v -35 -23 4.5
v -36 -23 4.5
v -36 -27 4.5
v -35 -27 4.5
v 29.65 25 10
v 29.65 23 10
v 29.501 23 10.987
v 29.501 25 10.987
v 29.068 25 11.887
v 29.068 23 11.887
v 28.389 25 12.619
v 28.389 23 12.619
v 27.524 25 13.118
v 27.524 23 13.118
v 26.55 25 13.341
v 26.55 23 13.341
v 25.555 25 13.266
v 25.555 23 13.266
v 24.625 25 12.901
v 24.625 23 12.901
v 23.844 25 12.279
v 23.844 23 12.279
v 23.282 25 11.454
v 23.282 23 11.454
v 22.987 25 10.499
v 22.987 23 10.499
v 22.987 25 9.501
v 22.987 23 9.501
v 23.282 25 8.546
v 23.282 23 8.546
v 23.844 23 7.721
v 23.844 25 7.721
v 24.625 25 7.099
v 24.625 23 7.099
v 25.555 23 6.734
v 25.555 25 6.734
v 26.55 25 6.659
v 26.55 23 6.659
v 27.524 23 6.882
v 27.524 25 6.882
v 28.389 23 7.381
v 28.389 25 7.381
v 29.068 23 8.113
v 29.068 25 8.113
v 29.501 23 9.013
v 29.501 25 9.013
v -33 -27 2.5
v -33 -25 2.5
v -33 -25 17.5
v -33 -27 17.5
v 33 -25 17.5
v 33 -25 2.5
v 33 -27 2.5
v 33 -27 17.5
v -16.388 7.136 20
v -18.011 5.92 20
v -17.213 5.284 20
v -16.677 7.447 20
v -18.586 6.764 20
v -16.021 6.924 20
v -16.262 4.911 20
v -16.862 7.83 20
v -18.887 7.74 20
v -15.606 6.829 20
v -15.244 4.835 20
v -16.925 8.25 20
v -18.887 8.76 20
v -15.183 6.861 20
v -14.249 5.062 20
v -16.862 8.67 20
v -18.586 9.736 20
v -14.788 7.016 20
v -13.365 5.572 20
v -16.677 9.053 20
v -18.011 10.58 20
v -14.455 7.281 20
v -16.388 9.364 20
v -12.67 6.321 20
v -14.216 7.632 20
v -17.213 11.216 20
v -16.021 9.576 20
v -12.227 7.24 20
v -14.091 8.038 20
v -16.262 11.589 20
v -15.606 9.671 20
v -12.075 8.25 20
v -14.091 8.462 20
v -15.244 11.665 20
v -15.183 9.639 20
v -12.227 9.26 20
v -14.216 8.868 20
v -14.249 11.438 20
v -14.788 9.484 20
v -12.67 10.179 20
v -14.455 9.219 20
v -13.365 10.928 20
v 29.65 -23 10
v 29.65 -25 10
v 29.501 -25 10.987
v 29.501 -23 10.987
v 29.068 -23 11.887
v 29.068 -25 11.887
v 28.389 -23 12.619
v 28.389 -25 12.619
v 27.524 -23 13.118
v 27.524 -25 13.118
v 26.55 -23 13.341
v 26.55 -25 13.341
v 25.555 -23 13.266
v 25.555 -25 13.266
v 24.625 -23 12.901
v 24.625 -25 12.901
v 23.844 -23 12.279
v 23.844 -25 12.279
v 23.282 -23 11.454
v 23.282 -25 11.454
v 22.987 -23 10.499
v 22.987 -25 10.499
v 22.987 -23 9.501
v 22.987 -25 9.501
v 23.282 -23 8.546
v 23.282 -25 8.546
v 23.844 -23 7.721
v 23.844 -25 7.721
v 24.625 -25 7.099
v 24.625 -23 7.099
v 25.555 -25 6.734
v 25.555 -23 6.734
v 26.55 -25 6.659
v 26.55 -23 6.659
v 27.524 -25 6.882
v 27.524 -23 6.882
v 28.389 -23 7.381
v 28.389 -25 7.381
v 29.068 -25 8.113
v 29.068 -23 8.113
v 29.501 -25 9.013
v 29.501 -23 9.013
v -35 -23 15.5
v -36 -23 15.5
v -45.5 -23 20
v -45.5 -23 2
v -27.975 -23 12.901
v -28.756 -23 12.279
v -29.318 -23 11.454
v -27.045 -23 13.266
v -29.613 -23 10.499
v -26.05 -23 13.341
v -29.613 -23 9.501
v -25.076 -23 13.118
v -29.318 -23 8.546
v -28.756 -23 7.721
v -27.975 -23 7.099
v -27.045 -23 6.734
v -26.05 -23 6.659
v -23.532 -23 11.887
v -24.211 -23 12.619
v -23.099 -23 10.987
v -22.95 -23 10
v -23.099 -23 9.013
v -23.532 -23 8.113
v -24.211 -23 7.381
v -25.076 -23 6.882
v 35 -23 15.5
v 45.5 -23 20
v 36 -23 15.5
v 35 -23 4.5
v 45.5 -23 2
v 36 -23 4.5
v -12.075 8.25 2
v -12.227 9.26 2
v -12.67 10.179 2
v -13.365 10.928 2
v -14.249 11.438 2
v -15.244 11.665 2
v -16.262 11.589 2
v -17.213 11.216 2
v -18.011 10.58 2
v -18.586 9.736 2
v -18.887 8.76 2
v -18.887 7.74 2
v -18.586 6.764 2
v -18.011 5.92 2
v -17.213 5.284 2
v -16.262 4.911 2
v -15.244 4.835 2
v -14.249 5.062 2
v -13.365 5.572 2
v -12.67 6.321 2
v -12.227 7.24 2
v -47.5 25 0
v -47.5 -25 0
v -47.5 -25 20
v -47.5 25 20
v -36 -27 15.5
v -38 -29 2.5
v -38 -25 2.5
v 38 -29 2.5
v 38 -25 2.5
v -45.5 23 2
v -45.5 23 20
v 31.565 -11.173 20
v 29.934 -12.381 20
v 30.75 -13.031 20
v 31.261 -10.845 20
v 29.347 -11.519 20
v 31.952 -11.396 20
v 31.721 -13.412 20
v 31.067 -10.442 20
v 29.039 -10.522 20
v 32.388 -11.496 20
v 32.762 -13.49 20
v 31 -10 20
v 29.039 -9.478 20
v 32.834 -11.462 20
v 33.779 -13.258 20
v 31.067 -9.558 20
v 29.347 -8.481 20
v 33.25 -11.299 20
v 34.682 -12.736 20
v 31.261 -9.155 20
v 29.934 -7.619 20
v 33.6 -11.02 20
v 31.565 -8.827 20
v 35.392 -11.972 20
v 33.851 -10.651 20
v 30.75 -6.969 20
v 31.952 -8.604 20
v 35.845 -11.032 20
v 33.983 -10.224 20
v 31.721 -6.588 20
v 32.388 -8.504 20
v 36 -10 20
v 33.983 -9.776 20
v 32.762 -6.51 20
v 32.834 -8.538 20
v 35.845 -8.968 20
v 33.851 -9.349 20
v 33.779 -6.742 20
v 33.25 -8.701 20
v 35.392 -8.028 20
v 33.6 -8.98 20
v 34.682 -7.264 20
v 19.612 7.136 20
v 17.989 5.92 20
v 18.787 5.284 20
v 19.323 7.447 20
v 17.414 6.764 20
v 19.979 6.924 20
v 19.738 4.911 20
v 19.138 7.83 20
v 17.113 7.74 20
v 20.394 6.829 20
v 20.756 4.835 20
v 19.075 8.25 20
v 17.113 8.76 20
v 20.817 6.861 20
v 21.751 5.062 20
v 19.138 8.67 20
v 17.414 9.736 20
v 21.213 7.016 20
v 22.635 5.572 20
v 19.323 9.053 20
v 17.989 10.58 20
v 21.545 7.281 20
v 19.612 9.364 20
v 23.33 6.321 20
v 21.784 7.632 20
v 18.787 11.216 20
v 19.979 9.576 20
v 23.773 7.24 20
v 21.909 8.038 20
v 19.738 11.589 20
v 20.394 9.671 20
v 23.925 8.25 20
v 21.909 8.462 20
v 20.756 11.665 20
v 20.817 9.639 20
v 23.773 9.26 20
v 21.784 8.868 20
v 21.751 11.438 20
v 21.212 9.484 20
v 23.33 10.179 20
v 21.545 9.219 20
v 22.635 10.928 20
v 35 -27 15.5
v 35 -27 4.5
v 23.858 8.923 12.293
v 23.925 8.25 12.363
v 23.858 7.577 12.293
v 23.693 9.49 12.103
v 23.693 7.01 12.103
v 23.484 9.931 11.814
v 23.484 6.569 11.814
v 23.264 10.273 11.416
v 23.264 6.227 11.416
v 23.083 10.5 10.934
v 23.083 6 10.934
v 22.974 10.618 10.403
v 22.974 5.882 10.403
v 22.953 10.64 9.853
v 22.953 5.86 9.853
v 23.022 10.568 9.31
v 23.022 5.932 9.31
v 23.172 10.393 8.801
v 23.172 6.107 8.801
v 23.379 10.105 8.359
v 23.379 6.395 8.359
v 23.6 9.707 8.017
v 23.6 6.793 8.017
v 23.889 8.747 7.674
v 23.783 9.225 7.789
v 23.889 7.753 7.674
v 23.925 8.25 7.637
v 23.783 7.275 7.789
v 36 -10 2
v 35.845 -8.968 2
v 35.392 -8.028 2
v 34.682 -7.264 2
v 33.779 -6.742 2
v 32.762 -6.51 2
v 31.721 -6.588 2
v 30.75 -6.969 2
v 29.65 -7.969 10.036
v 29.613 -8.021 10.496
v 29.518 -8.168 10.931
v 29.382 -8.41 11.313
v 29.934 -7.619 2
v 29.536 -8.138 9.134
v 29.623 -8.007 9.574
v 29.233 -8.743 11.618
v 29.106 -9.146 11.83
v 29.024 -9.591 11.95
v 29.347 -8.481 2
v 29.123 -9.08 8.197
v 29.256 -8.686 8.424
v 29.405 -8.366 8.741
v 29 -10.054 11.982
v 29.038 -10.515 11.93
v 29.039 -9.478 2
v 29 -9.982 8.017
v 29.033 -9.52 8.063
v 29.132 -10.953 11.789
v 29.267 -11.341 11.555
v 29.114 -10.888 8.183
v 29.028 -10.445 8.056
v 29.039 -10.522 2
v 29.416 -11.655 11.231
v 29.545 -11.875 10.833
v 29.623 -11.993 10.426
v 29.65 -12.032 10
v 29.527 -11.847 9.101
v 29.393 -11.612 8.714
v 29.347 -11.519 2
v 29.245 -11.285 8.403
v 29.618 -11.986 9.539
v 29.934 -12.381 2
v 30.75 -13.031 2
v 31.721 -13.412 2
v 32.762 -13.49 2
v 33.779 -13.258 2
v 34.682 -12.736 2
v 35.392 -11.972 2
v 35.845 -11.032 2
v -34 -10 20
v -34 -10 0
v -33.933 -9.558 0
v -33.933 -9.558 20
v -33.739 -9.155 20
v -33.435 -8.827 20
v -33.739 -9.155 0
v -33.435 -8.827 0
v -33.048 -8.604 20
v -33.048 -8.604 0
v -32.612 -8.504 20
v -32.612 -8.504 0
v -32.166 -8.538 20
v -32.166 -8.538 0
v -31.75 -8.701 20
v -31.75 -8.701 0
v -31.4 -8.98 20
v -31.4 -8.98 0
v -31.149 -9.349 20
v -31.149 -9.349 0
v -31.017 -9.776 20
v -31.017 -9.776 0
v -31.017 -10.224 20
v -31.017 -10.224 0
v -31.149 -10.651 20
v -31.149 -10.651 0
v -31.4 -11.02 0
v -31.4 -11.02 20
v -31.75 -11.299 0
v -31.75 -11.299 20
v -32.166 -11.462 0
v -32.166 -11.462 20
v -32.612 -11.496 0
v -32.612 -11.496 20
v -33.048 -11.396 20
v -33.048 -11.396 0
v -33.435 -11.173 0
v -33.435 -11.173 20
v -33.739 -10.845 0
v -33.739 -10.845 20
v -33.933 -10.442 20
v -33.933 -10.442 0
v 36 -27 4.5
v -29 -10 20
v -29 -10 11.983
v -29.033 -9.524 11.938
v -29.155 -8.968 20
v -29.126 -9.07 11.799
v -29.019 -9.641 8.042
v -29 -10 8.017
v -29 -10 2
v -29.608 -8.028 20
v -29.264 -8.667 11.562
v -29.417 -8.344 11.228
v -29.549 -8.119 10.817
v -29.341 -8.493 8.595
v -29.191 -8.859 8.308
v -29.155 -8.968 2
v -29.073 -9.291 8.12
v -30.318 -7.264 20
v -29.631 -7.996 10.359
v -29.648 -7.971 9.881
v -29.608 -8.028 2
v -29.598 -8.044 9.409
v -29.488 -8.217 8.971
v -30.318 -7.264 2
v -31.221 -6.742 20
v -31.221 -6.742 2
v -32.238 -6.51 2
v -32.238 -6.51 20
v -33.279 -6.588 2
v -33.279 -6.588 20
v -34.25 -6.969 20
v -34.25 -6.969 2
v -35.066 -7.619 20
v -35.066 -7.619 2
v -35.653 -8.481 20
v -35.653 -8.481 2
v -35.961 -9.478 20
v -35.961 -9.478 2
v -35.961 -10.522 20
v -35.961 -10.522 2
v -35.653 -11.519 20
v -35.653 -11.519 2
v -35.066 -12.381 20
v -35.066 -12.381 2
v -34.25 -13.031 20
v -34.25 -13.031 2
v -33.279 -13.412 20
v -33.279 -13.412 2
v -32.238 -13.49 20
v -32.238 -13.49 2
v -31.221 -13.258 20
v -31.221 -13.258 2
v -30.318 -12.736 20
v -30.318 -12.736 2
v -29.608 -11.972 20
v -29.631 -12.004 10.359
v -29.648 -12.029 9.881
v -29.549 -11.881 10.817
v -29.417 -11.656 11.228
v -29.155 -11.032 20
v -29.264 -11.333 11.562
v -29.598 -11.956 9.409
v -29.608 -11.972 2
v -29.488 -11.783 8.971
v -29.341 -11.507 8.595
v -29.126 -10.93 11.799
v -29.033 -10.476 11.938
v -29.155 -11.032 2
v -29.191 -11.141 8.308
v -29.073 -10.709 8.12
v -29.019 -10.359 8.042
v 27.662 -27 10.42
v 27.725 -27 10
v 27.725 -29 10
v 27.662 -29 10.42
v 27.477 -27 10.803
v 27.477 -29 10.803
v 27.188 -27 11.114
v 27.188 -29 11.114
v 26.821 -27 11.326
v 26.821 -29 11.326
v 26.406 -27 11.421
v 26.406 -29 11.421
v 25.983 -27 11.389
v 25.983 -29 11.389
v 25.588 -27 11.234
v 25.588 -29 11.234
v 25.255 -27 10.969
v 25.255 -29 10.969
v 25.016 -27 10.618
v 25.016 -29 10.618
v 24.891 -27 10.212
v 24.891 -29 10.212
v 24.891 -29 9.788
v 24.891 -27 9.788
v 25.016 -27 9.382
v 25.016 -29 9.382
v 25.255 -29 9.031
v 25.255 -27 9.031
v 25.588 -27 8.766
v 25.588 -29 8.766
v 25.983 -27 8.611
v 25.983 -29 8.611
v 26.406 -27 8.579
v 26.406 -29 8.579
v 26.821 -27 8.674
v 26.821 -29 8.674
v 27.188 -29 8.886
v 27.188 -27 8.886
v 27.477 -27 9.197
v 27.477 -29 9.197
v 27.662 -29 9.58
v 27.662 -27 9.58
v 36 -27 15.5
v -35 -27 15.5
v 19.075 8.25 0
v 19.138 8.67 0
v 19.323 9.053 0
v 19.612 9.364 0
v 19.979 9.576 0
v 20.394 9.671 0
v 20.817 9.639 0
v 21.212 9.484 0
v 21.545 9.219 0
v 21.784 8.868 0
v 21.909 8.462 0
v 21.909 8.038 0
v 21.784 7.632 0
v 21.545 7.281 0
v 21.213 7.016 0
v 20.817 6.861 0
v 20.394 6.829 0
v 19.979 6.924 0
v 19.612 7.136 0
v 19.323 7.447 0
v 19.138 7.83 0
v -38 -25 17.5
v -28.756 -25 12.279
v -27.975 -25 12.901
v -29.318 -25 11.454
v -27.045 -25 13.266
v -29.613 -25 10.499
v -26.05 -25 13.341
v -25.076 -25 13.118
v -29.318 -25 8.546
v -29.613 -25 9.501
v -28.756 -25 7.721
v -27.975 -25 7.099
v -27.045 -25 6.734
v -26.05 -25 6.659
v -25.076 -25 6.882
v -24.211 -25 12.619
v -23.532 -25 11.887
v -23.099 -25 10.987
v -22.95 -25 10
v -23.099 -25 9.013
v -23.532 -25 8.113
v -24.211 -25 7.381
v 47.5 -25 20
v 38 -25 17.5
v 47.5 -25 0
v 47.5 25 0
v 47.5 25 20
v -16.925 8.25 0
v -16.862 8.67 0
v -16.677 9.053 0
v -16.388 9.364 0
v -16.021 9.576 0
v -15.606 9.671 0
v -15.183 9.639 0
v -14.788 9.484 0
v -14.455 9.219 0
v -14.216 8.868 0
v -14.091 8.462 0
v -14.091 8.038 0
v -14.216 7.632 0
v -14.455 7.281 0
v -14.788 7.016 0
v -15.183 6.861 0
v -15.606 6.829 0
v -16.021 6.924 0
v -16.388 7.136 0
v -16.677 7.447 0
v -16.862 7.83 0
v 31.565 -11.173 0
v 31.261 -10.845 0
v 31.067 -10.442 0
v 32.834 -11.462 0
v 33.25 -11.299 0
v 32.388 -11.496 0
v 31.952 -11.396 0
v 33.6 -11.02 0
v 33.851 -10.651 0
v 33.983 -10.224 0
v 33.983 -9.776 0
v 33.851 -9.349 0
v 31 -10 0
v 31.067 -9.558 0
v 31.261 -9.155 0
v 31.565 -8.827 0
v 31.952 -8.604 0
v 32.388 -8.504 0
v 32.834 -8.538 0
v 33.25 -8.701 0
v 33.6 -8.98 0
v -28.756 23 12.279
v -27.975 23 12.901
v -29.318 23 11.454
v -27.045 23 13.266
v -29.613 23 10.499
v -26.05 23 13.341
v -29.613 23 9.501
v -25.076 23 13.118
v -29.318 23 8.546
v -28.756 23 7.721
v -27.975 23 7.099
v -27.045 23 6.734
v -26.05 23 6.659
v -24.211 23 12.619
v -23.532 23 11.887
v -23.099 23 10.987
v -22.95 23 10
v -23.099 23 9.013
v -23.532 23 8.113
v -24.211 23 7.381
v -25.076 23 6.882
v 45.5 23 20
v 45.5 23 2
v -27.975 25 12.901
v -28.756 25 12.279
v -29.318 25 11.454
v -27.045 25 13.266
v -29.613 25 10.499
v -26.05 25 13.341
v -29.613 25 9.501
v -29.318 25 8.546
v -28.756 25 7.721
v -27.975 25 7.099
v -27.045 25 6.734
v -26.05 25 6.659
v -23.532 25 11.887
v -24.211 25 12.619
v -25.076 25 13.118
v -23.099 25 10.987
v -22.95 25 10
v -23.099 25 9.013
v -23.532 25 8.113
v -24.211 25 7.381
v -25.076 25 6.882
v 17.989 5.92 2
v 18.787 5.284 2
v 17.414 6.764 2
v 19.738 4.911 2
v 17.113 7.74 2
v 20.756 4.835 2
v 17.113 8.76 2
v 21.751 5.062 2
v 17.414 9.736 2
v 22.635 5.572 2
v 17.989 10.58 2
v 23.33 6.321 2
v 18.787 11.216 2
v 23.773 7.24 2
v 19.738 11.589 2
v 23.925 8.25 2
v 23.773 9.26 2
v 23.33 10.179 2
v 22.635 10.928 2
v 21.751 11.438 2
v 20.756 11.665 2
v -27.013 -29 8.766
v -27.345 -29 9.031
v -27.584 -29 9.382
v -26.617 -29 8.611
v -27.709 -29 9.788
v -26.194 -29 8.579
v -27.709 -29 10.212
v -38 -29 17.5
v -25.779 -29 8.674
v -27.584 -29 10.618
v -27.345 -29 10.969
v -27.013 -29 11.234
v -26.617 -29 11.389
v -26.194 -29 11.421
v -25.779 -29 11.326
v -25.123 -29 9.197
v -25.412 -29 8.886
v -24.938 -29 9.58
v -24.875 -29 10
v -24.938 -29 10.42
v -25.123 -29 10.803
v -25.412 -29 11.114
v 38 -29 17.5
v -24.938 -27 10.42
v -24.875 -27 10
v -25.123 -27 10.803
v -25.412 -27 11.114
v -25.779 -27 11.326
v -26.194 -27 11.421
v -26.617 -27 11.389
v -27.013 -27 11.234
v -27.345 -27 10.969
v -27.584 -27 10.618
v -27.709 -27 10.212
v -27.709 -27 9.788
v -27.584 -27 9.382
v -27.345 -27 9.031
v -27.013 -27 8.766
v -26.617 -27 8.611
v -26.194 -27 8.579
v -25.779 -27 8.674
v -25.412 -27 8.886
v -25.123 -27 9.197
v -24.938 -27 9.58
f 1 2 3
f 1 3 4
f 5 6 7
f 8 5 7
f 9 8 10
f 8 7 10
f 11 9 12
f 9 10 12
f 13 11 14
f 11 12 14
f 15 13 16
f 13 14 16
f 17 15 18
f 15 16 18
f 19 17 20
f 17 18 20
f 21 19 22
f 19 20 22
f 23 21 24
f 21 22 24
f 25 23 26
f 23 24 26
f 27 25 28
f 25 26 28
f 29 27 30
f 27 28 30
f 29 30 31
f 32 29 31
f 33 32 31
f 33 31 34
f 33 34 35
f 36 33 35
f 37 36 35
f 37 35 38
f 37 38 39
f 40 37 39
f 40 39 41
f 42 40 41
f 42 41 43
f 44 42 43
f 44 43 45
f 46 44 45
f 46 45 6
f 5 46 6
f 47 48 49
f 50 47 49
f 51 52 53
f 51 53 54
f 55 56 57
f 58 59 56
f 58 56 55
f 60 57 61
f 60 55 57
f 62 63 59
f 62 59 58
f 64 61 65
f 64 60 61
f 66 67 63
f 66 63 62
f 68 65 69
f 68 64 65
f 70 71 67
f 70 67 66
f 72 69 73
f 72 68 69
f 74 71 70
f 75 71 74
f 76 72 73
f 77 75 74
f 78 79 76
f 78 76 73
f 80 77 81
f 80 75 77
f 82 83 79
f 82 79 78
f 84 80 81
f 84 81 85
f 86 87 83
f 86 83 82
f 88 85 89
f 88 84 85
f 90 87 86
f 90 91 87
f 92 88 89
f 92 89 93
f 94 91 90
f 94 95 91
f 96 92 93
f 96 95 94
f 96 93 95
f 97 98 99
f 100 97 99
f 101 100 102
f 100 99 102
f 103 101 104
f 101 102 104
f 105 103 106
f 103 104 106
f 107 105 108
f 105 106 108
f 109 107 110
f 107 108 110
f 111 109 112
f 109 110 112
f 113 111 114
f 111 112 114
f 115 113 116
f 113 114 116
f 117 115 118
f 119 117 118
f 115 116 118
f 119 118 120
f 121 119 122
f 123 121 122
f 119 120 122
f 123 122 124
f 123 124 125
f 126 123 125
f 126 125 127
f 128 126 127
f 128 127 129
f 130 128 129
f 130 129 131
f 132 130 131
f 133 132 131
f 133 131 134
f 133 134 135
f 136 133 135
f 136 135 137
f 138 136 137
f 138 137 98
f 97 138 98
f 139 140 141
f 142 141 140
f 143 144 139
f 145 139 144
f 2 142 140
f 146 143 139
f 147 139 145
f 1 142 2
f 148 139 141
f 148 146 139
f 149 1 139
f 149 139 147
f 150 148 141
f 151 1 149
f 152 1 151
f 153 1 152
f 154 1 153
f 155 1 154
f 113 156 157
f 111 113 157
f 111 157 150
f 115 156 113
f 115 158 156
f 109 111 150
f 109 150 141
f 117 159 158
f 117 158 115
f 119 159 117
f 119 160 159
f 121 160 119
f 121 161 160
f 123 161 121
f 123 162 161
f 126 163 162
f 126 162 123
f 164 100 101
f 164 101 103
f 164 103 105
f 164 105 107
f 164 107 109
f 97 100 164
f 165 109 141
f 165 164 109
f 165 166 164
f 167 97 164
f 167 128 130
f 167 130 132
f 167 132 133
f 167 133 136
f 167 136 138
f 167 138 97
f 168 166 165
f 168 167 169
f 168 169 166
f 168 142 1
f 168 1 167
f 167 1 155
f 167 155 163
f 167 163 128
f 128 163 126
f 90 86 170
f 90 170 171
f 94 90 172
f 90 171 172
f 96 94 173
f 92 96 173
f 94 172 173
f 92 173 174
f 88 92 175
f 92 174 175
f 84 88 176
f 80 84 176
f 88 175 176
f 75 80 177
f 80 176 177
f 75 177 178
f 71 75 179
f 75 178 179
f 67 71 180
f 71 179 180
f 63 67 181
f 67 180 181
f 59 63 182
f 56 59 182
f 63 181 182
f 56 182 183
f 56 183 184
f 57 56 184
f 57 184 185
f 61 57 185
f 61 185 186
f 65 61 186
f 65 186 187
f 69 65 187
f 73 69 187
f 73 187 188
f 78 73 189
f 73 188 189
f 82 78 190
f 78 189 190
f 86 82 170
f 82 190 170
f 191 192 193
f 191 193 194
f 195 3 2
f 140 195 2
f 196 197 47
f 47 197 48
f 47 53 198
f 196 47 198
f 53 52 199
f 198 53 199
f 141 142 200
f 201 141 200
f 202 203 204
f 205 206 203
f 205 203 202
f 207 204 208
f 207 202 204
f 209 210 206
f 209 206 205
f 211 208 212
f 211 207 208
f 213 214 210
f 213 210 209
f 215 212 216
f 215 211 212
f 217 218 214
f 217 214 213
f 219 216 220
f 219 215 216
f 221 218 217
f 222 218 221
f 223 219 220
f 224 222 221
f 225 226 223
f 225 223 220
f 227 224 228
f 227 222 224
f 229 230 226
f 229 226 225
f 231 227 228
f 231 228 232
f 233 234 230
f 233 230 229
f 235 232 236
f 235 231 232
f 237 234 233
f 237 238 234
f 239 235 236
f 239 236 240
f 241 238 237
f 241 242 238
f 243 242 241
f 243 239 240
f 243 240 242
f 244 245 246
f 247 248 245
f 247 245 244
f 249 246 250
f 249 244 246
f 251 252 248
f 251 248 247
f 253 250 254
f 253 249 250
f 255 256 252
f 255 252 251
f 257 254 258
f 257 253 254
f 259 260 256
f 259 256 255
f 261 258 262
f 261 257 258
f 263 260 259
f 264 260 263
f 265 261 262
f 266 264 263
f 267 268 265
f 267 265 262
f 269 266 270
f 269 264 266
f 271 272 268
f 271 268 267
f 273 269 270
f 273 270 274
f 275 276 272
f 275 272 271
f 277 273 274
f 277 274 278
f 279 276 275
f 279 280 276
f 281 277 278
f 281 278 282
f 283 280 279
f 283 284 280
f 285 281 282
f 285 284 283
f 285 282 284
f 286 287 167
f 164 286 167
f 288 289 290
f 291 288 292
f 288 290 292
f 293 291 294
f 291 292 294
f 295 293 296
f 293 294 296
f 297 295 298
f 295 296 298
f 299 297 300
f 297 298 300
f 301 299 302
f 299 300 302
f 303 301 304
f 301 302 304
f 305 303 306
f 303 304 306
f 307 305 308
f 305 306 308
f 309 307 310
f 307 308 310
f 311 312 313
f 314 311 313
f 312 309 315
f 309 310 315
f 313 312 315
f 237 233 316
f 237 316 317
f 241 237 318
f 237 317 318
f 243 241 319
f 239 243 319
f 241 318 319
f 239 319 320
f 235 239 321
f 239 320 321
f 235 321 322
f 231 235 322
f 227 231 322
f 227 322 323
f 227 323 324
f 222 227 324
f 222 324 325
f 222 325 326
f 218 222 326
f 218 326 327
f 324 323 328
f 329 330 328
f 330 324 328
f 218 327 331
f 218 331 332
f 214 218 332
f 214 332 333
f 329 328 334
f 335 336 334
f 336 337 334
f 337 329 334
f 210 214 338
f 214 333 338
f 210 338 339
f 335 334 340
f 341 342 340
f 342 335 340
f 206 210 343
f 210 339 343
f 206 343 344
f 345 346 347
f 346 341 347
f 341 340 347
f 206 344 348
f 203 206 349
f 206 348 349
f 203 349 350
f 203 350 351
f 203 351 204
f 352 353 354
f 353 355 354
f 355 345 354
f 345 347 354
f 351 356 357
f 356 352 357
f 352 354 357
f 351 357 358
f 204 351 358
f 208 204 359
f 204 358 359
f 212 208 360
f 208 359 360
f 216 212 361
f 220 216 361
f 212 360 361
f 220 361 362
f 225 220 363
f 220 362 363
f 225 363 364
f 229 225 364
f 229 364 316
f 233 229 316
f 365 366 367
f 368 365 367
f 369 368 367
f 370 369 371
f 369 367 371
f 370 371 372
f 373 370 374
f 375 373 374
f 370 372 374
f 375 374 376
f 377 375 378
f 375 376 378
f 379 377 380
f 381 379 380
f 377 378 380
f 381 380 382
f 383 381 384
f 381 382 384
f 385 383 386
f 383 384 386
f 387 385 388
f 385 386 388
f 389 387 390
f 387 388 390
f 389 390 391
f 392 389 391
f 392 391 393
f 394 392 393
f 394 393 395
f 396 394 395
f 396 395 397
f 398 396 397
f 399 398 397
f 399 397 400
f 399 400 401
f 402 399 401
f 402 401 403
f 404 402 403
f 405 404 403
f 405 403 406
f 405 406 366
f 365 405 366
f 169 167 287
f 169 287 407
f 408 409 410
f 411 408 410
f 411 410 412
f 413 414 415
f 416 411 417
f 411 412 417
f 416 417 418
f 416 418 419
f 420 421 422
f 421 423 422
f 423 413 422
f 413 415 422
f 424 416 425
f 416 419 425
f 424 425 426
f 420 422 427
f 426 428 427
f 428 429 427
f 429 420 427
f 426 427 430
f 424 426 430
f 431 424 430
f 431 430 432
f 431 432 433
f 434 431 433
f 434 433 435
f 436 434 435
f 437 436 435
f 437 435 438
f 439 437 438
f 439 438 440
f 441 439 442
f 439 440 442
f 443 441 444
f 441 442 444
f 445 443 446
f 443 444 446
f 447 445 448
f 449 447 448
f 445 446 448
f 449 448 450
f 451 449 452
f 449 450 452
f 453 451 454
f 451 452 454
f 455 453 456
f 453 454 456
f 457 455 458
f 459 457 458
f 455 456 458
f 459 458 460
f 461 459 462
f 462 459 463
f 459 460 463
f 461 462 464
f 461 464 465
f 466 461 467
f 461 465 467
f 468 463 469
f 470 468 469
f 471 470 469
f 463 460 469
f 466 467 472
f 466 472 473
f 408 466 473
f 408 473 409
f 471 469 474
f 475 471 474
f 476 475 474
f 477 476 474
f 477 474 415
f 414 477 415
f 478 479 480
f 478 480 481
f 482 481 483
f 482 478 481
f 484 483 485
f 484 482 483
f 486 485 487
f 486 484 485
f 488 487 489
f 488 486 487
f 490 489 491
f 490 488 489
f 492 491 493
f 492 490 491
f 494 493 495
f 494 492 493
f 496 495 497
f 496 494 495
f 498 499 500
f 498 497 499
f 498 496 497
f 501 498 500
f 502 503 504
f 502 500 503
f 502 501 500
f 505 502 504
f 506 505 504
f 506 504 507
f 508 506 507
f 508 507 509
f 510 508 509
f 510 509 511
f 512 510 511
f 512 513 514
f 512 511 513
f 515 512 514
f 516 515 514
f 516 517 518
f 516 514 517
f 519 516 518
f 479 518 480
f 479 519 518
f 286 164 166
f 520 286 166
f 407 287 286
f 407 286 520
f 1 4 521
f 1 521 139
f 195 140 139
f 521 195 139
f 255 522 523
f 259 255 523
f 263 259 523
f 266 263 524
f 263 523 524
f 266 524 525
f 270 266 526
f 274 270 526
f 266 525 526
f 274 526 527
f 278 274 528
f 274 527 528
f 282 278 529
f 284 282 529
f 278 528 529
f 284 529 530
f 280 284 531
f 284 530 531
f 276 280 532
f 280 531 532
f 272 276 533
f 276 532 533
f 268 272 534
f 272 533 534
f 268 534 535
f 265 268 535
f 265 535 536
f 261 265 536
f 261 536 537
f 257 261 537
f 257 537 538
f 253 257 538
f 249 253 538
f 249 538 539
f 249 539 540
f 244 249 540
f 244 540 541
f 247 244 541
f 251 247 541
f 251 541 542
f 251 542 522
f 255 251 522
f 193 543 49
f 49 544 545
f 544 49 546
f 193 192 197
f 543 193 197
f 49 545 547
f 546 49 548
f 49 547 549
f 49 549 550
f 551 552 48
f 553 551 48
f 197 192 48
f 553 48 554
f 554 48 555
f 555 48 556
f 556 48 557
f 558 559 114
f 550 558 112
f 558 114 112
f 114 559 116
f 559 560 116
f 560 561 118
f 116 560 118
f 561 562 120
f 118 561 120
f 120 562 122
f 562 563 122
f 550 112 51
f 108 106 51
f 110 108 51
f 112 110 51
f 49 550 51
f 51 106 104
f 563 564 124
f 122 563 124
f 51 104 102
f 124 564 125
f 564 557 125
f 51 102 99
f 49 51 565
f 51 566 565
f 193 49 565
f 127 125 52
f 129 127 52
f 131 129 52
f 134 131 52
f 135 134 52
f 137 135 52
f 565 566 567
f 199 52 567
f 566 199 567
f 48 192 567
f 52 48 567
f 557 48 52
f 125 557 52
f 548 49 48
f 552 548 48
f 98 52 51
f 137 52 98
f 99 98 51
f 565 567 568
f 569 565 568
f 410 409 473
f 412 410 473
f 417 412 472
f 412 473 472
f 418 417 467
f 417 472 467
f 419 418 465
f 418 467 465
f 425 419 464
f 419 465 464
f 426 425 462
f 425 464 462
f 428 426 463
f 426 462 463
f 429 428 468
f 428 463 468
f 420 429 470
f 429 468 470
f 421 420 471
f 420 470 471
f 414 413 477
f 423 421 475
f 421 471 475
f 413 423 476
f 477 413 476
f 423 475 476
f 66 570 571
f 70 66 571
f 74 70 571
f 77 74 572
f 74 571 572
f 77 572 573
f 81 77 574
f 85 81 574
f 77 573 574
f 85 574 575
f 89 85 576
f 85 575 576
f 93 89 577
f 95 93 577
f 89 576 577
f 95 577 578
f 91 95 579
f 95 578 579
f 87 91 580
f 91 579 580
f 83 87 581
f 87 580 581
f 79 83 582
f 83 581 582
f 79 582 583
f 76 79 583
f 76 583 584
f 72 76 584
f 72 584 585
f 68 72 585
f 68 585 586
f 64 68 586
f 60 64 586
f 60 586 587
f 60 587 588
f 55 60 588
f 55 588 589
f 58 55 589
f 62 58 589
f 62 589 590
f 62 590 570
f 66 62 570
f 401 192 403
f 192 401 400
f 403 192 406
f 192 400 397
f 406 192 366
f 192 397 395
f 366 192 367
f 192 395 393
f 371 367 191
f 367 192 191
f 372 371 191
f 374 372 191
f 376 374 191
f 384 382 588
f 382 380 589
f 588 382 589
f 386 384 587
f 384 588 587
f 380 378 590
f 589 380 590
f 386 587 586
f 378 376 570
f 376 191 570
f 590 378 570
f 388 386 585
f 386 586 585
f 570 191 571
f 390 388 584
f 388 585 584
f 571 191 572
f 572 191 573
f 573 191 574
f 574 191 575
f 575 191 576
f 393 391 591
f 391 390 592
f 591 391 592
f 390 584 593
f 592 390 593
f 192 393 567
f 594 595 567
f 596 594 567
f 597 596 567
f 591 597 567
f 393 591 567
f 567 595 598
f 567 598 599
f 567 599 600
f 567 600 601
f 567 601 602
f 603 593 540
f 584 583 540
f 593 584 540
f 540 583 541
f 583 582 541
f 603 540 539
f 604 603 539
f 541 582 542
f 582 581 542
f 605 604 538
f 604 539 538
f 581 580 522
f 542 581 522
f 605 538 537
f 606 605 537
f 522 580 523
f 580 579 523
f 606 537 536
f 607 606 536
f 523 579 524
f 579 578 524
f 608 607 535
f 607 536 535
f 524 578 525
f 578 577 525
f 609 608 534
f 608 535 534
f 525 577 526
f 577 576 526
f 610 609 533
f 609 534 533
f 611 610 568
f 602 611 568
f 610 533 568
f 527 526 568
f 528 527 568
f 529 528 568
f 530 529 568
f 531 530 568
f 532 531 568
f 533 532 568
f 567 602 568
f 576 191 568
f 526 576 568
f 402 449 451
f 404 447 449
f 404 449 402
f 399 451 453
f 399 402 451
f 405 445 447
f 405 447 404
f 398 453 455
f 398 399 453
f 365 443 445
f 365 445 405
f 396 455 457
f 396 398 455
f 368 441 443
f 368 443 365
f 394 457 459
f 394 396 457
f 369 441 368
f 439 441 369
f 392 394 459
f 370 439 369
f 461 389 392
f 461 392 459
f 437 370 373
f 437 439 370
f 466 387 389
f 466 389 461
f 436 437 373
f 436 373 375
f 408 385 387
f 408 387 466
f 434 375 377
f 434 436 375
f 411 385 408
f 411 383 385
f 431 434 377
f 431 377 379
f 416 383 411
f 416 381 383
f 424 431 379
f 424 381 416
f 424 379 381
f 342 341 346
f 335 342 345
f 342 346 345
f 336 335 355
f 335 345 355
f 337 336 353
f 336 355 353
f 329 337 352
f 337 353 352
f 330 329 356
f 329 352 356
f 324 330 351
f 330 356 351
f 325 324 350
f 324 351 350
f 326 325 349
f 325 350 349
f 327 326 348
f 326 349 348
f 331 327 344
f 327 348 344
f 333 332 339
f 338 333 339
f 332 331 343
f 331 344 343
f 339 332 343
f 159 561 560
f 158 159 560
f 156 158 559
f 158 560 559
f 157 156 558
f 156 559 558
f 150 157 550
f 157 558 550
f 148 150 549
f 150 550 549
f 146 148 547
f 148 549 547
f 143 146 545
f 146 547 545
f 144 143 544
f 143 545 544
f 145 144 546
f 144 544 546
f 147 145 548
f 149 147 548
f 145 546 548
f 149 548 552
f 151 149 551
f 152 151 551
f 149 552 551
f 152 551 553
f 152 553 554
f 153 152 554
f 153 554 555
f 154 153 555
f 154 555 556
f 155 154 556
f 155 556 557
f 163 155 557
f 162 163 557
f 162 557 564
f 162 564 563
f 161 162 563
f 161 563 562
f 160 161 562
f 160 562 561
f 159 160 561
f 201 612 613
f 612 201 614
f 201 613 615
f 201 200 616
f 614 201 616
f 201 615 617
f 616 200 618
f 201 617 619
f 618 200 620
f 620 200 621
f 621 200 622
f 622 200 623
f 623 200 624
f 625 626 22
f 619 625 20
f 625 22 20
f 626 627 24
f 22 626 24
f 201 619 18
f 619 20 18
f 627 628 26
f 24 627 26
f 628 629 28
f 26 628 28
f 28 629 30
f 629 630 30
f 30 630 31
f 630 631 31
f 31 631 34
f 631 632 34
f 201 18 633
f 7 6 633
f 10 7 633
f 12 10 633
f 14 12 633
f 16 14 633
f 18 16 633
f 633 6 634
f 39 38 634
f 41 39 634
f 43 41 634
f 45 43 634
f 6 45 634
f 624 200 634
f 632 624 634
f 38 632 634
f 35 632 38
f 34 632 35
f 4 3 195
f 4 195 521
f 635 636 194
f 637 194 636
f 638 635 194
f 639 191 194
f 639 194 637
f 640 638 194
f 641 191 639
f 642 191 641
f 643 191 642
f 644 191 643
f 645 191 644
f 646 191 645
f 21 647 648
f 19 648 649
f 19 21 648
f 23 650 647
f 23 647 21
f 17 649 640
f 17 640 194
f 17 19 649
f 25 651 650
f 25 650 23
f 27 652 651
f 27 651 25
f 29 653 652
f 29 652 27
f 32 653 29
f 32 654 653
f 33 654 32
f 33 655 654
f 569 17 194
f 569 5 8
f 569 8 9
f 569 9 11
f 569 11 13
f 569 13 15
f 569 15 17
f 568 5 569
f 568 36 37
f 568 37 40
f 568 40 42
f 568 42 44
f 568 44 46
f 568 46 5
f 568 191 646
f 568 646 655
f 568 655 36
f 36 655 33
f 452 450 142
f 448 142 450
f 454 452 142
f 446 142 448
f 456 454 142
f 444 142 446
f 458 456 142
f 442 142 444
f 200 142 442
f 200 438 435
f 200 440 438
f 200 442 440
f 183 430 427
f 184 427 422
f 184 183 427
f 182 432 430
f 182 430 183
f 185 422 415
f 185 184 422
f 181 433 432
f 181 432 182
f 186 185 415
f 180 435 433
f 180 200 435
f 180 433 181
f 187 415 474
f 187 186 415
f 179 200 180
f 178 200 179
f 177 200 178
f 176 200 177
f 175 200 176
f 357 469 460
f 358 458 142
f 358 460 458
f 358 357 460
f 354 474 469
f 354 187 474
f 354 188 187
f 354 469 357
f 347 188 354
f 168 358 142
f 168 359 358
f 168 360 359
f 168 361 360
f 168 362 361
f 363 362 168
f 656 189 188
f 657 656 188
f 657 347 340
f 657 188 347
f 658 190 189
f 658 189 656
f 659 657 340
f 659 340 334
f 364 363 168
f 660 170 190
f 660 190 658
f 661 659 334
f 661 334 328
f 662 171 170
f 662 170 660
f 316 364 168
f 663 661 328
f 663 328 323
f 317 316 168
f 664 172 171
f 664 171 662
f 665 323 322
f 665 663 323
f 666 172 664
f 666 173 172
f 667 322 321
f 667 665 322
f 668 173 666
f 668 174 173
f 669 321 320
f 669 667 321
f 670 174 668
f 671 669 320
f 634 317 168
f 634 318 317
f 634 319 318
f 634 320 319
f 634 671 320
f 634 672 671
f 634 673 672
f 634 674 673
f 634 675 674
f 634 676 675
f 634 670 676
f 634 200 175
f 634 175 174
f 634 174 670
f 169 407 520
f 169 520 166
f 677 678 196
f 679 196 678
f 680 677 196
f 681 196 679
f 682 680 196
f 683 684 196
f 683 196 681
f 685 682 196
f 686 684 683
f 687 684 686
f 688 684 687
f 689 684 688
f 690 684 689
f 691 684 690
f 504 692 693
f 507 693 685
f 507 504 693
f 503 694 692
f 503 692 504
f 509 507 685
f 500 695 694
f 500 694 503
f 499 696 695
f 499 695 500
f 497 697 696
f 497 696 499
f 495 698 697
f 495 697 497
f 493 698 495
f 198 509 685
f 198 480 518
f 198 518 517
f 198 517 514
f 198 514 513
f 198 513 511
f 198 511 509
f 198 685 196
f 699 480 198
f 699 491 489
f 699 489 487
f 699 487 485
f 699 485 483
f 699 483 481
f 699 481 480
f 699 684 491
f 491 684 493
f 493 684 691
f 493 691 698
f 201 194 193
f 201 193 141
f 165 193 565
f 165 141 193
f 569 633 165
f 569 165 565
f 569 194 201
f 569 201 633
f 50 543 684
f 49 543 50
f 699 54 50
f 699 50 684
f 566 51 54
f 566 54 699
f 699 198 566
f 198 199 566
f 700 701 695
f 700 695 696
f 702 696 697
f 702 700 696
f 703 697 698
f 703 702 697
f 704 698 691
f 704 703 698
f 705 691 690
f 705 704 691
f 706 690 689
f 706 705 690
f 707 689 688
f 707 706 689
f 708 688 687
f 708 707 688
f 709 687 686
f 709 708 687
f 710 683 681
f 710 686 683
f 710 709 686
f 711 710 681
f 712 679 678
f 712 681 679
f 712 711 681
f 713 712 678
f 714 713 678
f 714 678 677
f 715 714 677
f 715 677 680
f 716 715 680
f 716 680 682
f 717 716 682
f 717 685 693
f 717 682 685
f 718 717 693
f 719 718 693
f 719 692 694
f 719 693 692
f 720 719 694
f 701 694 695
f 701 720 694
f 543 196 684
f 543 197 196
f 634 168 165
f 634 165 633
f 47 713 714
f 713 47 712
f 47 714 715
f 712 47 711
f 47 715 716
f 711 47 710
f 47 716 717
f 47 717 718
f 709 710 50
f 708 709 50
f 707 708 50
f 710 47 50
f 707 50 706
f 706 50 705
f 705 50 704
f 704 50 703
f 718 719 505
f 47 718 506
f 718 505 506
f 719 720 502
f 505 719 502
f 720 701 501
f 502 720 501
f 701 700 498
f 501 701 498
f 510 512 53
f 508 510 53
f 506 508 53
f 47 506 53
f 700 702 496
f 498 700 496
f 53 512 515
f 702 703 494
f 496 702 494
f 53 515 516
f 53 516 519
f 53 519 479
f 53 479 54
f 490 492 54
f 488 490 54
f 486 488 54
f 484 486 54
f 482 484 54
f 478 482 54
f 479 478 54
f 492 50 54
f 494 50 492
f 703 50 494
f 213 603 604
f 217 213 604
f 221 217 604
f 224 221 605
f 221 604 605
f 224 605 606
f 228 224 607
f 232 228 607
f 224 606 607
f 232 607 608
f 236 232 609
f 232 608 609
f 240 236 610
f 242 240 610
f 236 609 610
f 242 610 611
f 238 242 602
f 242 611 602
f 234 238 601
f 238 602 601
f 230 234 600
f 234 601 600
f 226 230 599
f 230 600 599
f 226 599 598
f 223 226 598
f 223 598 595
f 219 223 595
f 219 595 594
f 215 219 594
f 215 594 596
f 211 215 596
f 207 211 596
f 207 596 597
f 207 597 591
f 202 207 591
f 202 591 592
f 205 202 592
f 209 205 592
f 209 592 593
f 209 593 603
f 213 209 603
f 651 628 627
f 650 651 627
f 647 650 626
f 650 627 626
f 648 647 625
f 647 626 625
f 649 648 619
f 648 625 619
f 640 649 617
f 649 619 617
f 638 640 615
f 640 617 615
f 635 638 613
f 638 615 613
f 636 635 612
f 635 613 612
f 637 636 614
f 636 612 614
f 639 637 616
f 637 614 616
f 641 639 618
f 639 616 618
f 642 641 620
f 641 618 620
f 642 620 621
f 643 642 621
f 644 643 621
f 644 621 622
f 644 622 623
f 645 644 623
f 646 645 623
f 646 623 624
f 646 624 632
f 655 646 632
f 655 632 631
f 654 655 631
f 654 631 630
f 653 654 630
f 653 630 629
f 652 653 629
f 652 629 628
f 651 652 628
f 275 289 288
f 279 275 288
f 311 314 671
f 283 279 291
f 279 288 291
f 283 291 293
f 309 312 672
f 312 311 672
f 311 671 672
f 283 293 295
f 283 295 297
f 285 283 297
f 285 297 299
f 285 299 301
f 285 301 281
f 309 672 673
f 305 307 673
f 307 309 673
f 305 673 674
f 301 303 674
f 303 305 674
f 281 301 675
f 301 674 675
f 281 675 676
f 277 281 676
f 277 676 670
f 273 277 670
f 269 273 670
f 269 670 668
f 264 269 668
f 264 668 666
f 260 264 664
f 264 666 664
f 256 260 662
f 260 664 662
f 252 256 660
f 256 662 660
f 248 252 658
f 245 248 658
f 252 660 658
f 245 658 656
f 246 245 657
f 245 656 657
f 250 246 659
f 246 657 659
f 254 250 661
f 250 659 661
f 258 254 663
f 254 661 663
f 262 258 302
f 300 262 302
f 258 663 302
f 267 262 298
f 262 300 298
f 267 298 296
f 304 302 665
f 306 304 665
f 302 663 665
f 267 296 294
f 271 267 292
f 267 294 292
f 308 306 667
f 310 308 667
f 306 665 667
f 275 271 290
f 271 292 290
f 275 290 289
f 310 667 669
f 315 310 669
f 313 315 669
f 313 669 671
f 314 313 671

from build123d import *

# Parameters (mm, degrees)
SKETCH1_W               = 95
SKETCH1_H               = 50
BOSS_EXTRUDE1_DEPTH     = 20
SKETCH4_R               = 1.425
CUT_EXTRUDE3_DEPTH      = 58.282196187
LPATTERN1_COUNT         = 2
LPATTERN1_PITCH         = 36
SKETCH5_R               = 1.5
CUT_EXTRUDE4_DEPTH      = 58.282196187
SKETCH6_W               = 5
SKETCH6_H               = 15
BOSS_EXTRUDE2_DEPTH     = 2
SKETCH7_W               = 76
SKETCH7_H               = 15
BOSS_EXTRUDE3_DEPTH     = 2
SHELL1_START            = 2
SHELL1_OUTLINE_W        = 91
SHELL1_OUTLINE_H        = 46
SHELL1_OUTLINE_R        = 3.5
SHELL1_OUTLINE_R_2      = 3.425
SHELL1_DEPTH            = 18
SHELL1_START_2          = 4.5
SHELL1_2_OUTLINE_W      = 1
SHELL1_2_OUTLINE_H      = 4
SHELL1_2_DEPTH          = 11
SKETCH2_R               = 3.35
CUT_EXTRUDE1_DEPTH      = 72.807033082
CUT_EXTRUDE5_DEPTH      = 75.647505009
CUT_EXTRUDE5_DEPTH_BACK = 75.647505009
SKETCH10_R              = 1.425


# Read off the part's stored shape, not the designer's step: Shell1
with BuildPart() as part:
    # Sketch1 → Boss-Extrude1 (new body)
    with BuildSketch(Plane.XY):
        Rectangle(SKETCH1_W, SKETCH1_H)
    extrude(amount=BOSS_EXTRUDE1_DEPTH)

    # Sketch4 → Cut-Extrude3 (cut, through all)
    with BuildSketch(Plane(origin=(0, 0, 0), x_dir=(-1, 0, 0), z_dir=(0, 0, -1))):
        with Locations((15.5, 8.25)):
            Circle(SKETCH4_R)
    cut_extrude3 = extrude(amount=-CUT_EXTRUDE3_DEPTH, mode=Mode.SUBTRACT)

    # LPattern1: Cut-Extrude3 ×2
    with Locations(*[(i * LPATTERN1_PITCH, 0, 0) for i in range(1, LPATTERN1_COUNT)]):
        add(cut_extrude3, mode=Mode.SUBTRACT)

    # Sketch5 → Cut-Extrude4 (cut, through all)
    with BuildSketch(Plane(origin=(0, 0, 0), x_dir=(-1, 0, 0), z_dir=(0, 0, -1))):
        with Locations((-32.5, -10)):
            Circle(SKETCH5_R)
        with Locations((32.5, -10)):
            Circle(SKETCH5_R)
    extrude(amount=-CUT_EXTRUDE4_DEPTH, mode=Mode.SUBTRACT)

    # Sketch6 → Boss-Extrude2 (add)
    with BuildSketch(Plane.XZ.offset(25)):
        with Locations((35.5, 10)):
            Rectangle(SKETCH6_W, SKETCH6_H)
    boss_extrude2 = extrude(amount=BOSS_EXTRUDE2_DEPTH)

    # Mirror1: Boss-Extrude2 across plane
    add(boss_extrude2.mirror(Plane(origin=(0, 0, 0), x_dir=(0, 0, 1), z_dir=(1, 0, 0))))

    # Sketch7 → Boss-Extrude3 (add)
    with BuildSketch(Plane.XZ.offset(27)):
        with Locations((0, 10)):
            Rectangle(SKETCH7_W, SKETCH7_H)
    extrude(amount=BOSS_EXTRUDE3_DEPTH)

    # Shell1 outline → Shell1 (cut)
    with BuildSketch(Plane.XY.offset(SHELL1_START)):
        Rectangle(SHELL1_OUTLINE_W, SHELL1_OUTLINE_H)
        with Locations((-32.5, -10)):
            Circle(SHELL1_OUTLINE_R, mode=Mode.SUBTRACT)
        with Locations((32.5, -10)):
            Circle(SHELL1_OUTLINE_R, mode=Mode.SUBTRACT)
        with Locations((-15.5, 8.25)):
            Circle(SHELL1_OUTLINE_R_2, mode=Mode.SUBTRACT)
        with Locations((20.5, 8.25)):
            Circle(SHELL1_OUTLINE_R_2, mode=Mode.SUBTRACT)
    extrude(amount=SHELL1_DEPTH, mode=Mode.SUBTRACT)

    # Shell1 2 outline → Shell1 2 (cut)
    with BuildSketch(Plane.XY.offset(SHELL1_START_2)):
        with Locations((-35.5, -25)):
            Rectangle(SHELL1_2_OUTLINE_W, SHELL1_2_OUTLINE_H)
        with Locations((35.5, -25)):
            Rectangle(SHELL1_2_OUTLINE_W, SHELL1_2_OUTLINE_H)
    extrude(amount=SHELL1_2_DEPTH, mode=Mode.SUBTRACT)

    # Sketch2 → Cut-Extrude1 (cut, through all)
    with BuildSketch(Plane.XZ.offset(25)):
        with Locations((-26.3, 10)):
            Circle(SKETCH2_R)
        with Locations((26.3, 10)):
            Circle(SKETCH2_R)
    extrude(amount=-CUT_EXTRUDE1_DEPTH, mode=Mode.SUBTRACT)

    # Sketch10 → Cut-Extrude5 (cut, two sides: drawn at the far end of the back side and taken through both)
    with BuildSketch(Plane.XZ.offset(29).offset(-CUT_EXTRUDE5_DEPTH_BACK)):
        with Locations((26.3, 10)):
            Circle(SKETCH10_R)
        with Locations((-26.3, 10)):
            Circle(SKETCH10_R)
    extrude(amount=CUT_EXTRUDE5_DEPTH + CUT_EXTRUDE5_DEPTH_BACK, mode=Mode.SUBTRACT)


solid = part.part
